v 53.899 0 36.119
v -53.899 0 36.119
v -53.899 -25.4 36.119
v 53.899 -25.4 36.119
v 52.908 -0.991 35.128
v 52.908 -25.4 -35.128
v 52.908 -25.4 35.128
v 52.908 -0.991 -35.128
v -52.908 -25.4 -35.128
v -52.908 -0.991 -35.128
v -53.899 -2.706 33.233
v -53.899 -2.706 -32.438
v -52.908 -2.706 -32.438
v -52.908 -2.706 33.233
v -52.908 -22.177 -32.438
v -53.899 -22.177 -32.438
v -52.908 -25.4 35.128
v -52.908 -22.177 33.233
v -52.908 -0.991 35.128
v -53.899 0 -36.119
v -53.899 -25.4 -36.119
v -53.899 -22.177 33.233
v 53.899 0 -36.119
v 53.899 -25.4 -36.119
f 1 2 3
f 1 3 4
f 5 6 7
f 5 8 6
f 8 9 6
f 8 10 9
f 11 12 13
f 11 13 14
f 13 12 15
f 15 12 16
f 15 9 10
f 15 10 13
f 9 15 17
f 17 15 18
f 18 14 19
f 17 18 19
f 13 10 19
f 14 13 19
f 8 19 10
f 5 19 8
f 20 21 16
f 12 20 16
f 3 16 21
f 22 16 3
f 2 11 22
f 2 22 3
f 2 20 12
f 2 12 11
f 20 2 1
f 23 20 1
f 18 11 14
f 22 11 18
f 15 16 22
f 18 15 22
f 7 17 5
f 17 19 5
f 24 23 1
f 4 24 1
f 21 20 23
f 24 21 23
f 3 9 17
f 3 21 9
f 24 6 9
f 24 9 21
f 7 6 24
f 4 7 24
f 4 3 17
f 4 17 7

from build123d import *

# Parameters (mm, degrees)
F0_W     = 107.7976
F0_H     = 72.2376
F1_DEPTH = 25.4
F2_T     = -0.9906
F3_W     = 19.471491
F3_H     = 65.671131
F4_DEPTH = 25.4


with BuildPart() as f1:
    # F0 (on Front) → F1 (new body)
    with BuildSketch(Plane.XZ):
        Rectangle(F0_W, F0_H)
    extrude(amount=F1_DEPTH)

    # F2
    f2_openings = [f1.faces().sort_by_distance(p)[0] for p in [
        (0, -25.4, 0),
    ]]
    offset(amount=F2_T, openings=f2_openings)

    # F3 (on face) → F4 (cut)
    with BuildSketch(Plane(origin=(-53.8988, 0, 0), x_dir=(0, -1, 0), z_dir=(-1, 0, 0))):
        with Locations((12.441532, 0.397727)):
            Rectangle(F3_W, F3_H)
    extrude(amount=-F4_DEPTH, mode=Mode.SUBTRACT)


solid = f1.part
